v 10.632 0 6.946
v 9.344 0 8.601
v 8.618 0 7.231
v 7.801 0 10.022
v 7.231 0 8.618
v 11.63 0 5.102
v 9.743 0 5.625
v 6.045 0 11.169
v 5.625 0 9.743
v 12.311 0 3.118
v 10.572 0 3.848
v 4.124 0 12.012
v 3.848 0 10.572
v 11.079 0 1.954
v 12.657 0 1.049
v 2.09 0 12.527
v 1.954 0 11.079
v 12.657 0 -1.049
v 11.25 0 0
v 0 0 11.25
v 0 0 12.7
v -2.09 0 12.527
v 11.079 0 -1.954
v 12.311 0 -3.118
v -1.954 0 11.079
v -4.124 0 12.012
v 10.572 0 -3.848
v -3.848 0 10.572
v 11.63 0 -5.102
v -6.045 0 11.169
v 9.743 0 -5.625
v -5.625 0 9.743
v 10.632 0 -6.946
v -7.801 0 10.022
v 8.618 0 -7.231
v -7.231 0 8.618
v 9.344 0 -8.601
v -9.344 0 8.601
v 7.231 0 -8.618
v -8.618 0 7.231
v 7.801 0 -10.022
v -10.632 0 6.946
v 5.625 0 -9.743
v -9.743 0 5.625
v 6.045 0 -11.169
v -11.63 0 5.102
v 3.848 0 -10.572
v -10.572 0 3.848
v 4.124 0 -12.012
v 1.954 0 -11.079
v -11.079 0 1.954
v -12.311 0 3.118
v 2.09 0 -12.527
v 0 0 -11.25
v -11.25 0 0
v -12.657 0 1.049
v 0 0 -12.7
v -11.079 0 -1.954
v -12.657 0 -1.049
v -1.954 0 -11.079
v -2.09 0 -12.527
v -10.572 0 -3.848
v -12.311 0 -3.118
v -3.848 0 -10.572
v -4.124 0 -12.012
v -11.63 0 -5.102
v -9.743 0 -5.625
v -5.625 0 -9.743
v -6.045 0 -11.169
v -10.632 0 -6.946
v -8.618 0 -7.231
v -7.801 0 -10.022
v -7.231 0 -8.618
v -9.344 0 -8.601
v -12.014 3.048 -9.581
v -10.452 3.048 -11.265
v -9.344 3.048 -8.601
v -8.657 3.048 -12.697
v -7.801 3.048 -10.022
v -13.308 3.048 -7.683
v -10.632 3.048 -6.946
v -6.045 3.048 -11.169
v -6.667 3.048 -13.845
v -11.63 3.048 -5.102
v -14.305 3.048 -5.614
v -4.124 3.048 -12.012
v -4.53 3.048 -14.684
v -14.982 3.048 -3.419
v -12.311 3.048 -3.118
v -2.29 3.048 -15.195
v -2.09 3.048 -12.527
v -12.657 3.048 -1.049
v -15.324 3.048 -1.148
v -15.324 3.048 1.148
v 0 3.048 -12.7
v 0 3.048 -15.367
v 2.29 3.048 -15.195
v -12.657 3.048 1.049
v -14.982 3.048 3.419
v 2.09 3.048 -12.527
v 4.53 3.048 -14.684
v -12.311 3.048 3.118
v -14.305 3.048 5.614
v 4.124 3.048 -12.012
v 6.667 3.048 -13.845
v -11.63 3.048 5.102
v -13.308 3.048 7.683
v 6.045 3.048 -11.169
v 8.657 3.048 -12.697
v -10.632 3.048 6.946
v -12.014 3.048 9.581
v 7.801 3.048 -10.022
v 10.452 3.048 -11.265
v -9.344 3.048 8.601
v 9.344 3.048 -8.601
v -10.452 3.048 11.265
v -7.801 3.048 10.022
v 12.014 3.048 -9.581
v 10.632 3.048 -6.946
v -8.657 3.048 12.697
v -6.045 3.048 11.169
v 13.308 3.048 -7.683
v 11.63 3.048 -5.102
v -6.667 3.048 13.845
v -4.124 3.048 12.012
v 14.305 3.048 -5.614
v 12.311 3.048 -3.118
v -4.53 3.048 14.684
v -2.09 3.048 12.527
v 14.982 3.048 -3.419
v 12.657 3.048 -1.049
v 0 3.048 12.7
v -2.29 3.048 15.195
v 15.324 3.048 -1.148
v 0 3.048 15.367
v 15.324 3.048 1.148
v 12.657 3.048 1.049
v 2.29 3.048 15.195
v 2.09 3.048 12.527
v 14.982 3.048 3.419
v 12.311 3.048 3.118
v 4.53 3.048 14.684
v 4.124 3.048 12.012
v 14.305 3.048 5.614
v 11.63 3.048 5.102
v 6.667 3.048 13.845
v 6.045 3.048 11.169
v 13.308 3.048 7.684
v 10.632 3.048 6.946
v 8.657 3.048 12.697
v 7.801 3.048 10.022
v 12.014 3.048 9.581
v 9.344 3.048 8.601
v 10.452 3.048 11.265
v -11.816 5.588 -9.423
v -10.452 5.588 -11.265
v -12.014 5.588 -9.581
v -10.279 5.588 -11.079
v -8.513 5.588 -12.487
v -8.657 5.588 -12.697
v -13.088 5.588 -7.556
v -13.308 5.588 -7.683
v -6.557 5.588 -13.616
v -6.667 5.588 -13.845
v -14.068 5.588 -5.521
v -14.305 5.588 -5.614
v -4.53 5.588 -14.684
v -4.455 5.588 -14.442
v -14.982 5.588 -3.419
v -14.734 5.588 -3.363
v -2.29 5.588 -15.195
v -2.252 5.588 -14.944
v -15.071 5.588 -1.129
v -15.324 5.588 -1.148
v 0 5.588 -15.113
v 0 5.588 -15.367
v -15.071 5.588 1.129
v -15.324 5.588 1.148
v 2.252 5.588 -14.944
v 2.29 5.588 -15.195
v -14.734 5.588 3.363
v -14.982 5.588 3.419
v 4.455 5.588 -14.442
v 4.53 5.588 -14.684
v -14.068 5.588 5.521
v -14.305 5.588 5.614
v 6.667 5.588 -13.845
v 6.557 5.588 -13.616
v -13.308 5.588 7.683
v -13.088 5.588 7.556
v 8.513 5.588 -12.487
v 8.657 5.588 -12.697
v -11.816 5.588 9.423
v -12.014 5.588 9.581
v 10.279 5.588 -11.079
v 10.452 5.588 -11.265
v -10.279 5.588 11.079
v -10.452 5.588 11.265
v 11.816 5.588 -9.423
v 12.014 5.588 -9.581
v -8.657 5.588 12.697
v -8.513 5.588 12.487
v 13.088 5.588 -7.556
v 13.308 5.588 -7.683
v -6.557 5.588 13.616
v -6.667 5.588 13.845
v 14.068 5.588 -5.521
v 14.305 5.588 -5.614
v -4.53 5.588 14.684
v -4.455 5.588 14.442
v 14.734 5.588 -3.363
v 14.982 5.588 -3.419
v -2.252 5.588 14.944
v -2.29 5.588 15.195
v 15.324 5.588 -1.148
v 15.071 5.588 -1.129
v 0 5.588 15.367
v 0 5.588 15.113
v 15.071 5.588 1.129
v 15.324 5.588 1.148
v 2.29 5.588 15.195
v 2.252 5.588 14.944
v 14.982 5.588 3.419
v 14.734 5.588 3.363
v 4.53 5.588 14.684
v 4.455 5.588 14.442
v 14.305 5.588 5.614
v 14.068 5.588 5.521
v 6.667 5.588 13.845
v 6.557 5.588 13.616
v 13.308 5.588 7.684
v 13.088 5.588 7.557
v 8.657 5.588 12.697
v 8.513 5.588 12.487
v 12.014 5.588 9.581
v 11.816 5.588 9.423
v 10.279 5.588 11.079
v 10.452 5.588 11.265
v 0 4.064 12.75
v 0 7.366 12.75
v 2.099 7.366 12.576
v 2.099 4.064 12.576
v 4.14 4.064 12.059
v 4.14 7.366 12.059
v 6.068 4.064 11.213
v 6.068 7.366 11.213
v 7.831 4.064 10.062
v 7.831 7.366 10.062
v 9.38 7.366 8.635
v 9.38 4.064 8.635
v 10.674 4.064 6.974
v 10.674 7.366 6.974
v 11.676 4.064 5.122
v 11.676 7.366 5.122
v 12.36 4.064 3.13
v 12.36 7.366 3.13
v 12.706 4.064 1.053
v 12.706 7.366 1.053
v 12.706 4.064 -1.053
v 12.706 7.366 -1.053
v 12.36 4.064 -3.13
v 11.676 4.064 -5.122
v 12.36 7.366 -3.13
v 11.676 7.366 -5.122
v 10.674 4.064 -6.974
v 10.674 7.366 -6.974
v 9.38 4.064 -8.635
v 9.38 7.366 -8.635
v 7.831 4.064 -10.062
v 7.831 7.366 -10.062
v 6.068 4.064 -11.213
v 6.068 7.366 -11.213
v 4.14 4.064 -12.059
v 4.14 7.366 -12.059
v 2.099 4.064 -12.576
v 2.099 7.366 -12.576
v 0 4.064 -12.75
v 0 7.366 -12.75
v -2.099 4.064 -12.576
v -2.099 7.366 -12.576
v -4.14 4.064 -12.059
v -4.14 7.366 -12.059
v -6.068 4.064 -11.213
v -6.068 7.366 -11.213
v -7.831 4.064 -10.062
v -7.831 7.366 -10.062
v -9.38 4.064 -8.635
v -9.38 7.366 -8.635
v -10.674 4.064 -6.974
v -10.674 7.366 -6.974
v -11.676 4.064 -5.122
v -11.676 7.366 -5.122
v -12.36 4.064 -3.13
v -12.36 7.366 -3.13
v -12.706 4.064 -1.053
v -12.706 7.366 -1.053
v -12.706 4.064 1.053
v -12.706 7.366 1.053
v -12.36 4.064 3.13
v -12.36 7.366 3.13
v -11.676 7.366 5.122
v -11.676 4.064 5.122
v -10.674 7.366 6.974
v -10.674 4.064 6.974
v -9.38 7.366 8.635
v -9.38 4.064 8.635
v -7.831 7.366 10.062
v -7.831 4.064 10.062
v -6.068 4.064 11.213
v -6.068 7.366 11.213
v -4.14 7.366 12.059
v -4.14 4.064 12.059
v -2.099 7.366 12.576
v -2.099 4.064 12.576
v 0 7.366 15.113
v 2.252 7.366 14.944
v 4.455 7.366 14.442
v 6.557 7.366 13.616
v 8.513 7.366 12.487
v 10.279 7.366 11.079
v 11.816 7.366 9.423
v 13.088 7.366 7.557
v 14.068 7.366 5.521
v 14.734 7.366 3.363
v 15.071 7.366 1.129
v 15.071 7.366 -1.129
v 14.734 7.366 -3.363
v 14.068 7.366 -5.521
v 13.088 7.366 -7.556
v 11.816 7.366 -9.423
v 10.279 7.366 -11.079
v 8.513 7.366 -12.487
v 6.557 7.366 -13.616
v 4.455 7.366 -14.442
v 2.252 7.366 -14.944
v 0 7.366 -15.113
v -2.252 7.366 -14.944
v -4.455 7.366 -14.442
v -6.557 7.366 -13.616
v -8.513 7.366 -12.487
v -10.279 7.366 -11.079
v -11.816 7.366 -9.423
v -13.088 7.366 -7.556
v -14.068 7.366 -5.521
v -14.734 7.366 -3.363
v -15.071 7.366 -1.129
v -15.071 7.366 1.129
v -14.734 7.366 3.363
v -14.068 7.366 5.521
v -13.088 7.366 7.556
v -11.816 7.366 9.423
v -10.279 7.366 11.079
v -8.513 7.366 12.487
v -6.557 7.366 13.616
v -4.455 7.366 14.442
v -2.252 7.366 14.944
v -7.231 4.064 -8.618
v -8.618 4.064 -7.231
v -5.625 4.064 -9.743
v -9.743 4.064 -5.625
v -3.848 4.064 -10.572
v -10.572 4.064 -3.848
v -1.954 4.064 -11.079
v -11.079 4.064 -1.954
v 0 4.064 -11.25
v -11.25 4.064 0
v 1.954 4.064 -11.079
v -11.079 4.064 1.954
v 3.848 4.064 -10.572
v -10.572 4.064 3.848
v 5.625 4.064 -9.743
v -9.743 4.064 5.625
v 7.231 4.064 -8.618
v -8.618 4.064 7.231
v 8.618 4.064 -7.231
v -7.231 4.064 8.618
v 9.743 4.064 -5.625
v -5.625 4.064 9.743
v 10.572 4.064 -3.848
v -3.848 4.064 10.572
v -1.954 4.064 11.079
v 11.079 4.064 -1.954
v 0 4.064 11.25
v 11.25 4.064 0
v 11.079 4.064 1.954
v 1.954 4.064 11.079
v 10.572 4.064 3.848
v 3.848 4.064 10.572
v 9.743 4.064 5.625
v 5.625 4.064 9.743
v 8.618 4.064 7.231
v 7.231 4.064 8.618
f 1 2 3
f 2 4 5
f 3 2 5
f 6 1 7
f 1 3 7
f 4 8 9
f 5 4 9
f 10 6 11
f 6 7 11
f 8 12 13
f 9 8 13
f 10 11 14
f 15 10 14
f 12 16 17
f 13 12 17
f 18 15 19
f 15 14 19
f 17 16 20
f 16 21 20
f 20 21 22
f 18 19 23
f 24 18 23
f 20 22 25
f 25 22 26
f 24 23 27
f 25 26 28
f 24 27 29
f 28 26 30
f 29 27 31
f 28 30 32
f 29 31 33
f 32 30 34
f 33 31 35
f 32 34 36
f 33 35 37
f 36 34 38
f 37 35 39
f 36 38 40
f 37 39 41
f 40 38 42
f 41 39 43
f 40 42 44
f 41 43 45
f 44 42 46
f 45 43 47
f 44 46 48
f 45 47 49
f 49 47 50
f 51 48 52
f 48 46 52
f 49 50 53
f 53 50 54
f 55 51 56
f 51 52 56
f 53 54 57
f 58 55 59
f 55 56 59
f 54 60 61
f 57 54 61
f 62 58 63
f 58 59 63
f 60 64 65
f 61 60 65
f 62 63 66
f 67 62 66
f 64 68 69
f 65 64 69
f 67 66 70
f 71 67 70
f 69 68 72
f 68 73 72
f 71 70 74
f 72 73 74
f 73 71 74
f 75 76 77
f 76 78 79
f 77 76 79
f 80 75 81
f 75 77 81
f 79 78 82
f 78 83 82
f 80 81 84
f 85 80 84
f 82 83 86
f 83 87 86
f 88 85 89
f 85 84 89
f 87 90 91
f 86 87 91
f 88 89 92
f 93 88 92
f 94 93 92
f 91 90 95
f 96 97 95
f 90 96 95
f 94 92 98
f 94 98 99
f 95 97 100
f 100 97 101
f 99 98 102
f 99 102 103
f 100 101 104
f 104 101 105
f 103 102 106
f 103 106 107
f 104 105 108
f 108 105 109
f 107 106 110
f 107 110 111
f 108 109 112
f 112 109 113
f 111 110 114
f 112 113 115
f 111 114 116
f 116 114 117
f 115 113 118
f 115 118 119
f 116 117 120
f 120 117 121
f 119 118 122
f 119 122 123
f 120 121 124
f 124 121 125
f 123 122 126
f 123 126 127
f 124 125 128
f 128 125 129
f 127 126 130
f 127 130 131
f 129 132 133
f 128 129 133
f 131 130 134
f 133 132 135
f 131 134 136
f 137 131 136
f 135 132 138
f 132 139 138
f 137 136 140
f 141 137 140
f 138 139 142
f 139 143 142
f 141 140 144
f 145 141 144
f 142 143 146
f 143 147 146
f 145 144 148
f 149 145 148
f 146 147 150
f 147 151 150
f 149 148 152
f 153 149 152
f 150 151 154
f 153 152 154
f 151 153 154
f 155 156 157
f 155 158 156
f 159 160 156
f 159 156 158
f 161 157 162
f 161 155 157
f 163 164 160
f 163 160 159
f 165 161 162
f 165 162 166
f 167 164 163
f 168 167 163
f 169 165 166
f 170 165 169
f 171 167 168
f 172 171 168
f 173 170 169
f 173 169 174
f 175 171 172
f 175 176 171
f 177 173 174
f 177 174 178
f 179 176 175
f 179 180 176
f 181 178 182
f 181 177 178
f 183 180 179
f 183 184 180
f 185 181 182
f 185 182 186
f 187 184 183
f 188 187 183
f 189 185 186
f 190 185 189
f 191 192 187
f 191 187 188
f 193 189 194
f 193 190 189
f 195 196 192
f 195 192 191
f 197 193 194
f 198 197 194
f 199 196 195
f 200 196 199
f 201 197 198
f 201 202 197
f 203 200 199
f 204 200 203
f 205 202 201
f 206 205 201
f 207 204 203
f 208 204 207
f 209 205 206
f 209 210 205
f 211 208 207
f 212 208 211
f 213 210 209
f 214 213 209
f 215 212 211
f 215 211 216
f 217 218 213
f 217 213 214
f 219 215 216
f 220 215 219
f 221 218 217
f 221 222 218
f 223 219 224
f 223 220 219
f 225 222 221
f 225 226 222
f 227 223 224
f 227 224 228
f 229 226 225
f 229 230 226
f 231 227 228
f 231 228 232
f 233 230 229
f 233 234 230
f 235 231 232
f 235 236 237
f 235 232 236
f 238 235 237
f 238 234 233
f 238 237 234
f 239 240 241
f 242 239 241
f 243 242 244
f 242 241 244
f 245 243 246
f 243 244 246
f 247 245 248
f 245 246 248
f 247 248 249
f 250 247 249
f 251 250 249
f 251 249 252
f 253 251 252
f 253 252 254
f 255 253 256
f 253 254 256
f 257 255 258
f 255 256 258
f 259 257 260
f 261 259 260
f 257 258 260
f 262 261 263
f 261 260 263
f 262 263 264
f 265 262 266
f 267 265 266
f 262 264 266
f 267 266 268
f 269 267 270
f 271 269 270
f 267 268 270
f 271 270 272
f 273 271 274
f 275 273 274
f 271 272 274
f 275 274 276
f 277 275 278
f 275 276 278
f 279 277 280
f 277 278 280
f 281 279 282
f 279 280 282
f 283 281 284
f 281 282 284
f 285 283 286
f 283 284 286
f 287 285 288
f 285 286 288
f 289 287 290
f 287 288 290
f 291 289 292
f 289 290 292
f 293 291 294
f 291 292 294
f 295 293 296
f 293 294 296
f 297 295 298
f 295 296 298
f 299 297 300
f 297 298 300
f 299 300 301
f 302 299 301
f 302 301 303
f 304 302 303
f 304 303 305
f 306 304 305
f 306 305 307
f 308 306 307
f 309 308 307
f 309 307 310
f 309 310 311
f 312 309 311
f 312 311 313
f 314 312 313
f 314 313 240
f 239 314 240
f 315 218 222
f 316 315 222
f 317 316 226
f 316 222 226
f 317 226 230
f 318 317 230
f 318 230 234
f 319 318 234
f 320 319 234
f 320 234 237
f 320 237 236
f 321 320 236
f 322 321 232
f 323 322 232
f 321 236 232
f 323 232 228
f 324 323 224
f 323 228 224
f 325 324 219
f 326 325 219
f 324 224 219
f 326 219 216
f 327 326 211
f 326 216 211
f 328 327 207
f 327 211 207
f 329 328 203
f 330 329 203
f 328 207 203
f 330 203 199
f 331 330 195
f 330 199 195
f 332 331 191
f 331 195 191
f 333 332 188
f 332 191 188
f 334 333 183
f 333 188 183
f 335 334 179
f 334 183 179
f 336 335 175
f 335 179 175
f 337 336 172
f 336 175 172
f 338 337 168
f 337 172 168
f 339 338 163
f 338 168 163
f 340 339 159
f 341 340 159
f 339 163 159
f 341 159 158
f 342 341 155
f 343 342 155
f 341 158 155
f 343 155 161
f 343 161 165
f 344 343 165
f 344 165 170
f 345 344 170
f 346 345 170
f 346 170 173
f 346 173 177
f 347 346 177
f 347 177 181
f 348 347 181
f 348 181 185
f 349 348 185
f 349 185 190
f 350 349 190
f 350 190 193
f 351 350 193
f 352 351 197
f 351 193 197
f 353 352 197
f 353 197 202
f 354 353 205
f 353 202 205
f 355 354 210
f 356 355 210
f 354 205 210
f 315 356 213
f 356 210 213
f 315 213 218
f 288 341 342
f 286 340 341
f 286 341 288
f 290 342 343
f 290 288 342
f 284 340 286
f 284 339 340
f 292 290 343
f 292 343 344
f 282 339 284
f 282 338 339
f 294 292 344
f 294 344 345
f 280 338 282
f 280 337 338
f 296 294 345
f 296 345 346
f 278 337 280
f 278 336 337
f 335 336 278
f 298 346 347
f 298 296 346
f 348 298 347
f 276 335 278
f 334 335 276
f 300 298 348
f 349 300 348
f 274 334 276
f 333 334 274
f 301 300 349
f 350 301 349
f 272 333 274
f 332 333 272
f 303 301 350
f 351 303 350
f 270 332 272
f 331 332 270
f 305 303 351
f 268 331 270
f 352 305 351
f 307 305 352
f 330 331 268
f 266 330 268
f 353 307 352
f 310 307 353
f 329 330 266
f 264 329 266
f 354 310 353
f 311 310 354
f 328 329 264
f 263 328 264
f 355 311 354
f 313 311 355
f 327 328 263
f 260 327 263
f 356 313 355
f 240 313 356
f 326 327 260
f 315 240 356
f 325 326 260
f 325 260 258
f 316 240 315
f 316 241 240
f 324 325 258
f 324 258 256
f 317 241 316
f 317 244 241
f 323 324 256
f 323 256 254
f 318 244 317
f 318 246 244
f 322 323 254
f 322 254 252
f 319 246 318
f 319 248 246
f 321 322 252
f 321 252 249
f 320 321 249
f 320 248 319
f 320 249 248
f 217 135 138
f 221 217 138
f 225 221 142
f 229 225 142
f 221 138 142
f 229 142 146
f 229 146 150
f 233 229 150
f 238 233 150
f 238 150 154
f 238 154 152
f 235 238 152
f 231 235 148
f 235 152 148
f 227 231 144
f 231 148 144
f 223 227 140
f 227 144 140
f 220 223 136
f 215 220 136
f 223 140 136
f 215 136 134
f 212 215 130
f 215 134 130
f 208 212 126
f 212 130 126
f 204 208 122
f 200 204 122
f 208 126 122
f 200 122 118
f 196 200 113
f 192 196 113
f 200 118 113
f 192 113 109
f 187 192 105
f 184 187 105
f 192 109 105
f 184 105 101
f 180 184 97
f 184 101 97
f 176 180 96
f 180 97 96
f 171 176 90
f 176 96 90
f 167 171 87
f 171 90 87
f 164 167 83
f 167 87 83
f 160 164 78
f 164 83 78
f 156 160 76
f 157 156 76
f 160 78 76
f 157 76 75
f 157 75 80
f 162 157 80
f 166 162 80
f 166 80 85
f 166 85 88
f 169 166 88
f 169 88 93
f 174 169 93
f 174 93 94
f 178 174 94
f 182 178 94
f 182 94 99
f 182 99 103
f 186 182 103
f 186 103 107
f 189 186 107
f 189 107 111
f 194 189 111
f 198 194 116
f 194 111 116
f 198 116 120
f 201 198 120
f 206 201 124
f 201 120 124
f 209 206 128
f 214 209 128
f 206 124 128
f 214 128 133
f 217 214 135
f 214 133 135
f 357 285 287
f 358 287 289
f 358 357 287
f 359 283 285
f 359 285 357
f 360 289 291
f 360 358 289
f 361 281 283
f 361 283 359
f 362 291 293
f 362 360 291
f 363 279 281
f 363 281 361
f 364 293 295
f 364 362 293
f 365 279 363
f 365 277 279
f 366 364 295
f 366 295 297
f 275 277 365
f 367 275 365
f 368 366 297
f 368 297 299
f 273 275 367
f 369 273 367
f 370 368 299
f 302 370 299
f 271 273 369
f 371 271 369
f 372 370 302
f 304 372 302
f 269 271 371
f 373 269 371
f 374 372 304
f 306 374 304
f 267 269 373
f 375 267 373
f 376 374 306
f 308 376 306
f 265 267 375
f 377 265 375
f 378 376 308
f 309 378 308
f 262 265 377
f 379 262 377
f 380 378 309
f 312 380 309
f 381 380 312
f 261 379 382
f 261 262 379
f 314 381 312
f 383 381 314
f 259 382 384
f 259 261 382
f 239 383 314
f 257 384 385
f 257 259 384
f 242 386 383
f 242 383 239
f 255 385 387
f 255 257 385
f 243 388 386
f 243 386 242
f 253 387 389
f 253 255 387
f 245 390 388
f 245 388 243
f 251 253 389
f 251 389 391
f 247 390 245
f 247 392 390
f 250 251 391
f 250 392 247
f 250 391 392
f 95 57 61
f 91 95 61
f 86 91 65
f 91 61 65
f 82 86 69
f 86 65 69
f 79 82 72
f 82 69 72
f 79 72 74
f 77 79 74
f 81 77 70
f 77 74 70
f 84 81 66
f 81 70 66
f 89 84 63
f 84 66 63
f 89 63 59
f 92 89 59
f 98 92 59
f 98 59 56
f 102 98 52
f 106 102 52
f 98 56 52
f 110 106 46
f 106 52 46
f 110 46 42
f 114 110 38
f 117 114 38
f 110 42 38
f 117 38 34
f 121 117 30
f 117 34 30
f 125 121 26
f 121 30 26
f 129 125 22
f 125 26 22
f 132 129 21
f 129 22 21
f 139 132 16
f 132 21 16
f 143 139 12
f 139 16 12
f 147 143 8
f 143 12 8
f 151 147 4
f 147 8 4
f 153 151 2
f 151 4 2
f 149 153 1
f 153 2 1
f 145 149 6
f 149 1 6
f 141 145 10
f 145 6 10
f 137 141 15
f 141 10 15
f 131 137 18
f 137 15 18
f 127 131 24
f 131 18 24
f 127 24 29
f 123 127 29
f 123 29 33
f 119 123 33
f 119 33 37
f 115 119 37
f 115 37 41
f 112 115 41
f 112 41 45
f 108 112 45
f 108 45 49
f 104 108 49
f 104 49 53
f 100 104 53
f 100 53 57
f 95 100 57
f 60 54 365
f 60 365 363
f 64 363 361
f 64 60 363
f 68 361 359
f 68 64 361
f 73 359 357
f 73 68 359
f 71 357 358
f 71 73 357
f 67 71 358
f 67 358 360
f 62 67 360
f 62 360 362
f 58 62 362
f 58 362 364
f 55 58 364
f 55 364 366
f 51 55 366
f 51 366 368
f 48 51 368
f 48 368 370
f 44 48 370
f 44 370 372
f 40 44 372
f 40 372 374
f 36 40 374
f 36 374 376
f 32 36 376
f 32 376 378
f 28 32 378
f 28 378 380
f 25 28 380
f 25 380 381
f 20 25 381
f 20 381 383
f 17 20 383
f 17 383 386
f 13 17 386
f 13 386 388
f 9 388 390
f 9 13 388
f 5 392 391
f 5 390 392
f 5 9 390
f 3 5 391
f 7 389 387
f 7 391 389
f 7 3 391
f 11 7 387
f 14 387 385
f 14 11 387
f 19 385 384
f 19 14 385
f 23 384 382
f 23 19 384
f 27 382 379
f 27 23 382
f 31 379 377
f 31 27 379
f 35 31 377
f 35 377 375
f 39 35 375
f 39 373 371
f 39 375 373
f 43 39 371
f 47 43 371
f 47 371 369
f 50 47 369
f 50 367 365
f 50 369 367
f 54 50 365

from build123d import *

# Parameters (mm, degrees)
SKETCH1_R           = 12.7
SKETCH1_R_2         = 11.25
BOSS_EXTRUDE1_DEPTH = 3.048
SKETCH2_R           = 15.367
BOSS_EXTRUDE2_DEPTH = 2.54
SKETCH3_R           = 15.113
BOSS_EXTRUDE3_DEPTH = 1.778
SKETCH4_R           = 11.25
CUT_EXTRUDE1_DEPTH  = 4.318
SKETCH5_R           = 12.75
CUT_EXTRUDE2_DEPTH  = 3.302


with BuildPart() as part:
    # Sketch1 → Boss-Extrude1 (new body)
    with BuildSketch(Plane(origin=(0, 0, 0), x_dir=(1, 0, 0), z_dir=(0, 1, 0))):
        with Locations(Location((0, 0, 0), (0, 0, 90))):
            Circle(SKETCH1_R)
        with Locations(Location((0, 0, 0), (0, 0, 90))):
            Circle(SKETCH1_R_2, mode=Mode.SUBTRACT)
    extrude(amount=BOSS_EXTRUDE1_DEPTH)

    # Sketch2 → Boss-Extrude2 (add)
    with BuildSketch(Plane(origin=(0, 3.048, 0), x_dir=(1, 0, 0), z_dir=(0, 1, 0))):
        with Locations(Location((0, 0, 0), (0, 0, 270))):
            Circle(SKETCH2_R)
    extrude(amount=BOSS_EXTRUDE2_DEPTH)

    # Sketch3 → Boss-Extrude3 (add)
    with BuildSketch(Plane(origin=(0, 5.588, 0), x_dir=(1, 0, 0), z_dir=(0, 1, 0))):
        with Locations(Location((0, 0, 0), (0, 0, 270))):
            Circle(SKETCH3_R)
    extrude(amount=BOSS_EXTRUDE3_DEPTH)

    # Sketch4 → Cut-Extrude1 (cut)
    with BuildSketch(Plane.XZ.offset(-3.048)):
        with Locations(Location((0, 0, 0), (0, 0, 270))):
            Circle(SKETCH4_R)
    extrude(amount=-CUT_EXTRUDE1_DEPTH, mode=Mode.SUBTRACT)

    # Sketch5 → Cut-Extrude2 (cut)
    with BuildSketch(Plane(origin=(0, 7.366, 0), x_dir=(1, 0, 0), z_dir=(0, 1, 0))):
        with Locations(Location((0, 0, 0), (0, 0, 270))):
            Circle(SKETCH5_R)
    extrude(amount=-CUT_EXTRUDE2_DEPTH, mode=Mode.SUBTRACT)


solid = part.part
